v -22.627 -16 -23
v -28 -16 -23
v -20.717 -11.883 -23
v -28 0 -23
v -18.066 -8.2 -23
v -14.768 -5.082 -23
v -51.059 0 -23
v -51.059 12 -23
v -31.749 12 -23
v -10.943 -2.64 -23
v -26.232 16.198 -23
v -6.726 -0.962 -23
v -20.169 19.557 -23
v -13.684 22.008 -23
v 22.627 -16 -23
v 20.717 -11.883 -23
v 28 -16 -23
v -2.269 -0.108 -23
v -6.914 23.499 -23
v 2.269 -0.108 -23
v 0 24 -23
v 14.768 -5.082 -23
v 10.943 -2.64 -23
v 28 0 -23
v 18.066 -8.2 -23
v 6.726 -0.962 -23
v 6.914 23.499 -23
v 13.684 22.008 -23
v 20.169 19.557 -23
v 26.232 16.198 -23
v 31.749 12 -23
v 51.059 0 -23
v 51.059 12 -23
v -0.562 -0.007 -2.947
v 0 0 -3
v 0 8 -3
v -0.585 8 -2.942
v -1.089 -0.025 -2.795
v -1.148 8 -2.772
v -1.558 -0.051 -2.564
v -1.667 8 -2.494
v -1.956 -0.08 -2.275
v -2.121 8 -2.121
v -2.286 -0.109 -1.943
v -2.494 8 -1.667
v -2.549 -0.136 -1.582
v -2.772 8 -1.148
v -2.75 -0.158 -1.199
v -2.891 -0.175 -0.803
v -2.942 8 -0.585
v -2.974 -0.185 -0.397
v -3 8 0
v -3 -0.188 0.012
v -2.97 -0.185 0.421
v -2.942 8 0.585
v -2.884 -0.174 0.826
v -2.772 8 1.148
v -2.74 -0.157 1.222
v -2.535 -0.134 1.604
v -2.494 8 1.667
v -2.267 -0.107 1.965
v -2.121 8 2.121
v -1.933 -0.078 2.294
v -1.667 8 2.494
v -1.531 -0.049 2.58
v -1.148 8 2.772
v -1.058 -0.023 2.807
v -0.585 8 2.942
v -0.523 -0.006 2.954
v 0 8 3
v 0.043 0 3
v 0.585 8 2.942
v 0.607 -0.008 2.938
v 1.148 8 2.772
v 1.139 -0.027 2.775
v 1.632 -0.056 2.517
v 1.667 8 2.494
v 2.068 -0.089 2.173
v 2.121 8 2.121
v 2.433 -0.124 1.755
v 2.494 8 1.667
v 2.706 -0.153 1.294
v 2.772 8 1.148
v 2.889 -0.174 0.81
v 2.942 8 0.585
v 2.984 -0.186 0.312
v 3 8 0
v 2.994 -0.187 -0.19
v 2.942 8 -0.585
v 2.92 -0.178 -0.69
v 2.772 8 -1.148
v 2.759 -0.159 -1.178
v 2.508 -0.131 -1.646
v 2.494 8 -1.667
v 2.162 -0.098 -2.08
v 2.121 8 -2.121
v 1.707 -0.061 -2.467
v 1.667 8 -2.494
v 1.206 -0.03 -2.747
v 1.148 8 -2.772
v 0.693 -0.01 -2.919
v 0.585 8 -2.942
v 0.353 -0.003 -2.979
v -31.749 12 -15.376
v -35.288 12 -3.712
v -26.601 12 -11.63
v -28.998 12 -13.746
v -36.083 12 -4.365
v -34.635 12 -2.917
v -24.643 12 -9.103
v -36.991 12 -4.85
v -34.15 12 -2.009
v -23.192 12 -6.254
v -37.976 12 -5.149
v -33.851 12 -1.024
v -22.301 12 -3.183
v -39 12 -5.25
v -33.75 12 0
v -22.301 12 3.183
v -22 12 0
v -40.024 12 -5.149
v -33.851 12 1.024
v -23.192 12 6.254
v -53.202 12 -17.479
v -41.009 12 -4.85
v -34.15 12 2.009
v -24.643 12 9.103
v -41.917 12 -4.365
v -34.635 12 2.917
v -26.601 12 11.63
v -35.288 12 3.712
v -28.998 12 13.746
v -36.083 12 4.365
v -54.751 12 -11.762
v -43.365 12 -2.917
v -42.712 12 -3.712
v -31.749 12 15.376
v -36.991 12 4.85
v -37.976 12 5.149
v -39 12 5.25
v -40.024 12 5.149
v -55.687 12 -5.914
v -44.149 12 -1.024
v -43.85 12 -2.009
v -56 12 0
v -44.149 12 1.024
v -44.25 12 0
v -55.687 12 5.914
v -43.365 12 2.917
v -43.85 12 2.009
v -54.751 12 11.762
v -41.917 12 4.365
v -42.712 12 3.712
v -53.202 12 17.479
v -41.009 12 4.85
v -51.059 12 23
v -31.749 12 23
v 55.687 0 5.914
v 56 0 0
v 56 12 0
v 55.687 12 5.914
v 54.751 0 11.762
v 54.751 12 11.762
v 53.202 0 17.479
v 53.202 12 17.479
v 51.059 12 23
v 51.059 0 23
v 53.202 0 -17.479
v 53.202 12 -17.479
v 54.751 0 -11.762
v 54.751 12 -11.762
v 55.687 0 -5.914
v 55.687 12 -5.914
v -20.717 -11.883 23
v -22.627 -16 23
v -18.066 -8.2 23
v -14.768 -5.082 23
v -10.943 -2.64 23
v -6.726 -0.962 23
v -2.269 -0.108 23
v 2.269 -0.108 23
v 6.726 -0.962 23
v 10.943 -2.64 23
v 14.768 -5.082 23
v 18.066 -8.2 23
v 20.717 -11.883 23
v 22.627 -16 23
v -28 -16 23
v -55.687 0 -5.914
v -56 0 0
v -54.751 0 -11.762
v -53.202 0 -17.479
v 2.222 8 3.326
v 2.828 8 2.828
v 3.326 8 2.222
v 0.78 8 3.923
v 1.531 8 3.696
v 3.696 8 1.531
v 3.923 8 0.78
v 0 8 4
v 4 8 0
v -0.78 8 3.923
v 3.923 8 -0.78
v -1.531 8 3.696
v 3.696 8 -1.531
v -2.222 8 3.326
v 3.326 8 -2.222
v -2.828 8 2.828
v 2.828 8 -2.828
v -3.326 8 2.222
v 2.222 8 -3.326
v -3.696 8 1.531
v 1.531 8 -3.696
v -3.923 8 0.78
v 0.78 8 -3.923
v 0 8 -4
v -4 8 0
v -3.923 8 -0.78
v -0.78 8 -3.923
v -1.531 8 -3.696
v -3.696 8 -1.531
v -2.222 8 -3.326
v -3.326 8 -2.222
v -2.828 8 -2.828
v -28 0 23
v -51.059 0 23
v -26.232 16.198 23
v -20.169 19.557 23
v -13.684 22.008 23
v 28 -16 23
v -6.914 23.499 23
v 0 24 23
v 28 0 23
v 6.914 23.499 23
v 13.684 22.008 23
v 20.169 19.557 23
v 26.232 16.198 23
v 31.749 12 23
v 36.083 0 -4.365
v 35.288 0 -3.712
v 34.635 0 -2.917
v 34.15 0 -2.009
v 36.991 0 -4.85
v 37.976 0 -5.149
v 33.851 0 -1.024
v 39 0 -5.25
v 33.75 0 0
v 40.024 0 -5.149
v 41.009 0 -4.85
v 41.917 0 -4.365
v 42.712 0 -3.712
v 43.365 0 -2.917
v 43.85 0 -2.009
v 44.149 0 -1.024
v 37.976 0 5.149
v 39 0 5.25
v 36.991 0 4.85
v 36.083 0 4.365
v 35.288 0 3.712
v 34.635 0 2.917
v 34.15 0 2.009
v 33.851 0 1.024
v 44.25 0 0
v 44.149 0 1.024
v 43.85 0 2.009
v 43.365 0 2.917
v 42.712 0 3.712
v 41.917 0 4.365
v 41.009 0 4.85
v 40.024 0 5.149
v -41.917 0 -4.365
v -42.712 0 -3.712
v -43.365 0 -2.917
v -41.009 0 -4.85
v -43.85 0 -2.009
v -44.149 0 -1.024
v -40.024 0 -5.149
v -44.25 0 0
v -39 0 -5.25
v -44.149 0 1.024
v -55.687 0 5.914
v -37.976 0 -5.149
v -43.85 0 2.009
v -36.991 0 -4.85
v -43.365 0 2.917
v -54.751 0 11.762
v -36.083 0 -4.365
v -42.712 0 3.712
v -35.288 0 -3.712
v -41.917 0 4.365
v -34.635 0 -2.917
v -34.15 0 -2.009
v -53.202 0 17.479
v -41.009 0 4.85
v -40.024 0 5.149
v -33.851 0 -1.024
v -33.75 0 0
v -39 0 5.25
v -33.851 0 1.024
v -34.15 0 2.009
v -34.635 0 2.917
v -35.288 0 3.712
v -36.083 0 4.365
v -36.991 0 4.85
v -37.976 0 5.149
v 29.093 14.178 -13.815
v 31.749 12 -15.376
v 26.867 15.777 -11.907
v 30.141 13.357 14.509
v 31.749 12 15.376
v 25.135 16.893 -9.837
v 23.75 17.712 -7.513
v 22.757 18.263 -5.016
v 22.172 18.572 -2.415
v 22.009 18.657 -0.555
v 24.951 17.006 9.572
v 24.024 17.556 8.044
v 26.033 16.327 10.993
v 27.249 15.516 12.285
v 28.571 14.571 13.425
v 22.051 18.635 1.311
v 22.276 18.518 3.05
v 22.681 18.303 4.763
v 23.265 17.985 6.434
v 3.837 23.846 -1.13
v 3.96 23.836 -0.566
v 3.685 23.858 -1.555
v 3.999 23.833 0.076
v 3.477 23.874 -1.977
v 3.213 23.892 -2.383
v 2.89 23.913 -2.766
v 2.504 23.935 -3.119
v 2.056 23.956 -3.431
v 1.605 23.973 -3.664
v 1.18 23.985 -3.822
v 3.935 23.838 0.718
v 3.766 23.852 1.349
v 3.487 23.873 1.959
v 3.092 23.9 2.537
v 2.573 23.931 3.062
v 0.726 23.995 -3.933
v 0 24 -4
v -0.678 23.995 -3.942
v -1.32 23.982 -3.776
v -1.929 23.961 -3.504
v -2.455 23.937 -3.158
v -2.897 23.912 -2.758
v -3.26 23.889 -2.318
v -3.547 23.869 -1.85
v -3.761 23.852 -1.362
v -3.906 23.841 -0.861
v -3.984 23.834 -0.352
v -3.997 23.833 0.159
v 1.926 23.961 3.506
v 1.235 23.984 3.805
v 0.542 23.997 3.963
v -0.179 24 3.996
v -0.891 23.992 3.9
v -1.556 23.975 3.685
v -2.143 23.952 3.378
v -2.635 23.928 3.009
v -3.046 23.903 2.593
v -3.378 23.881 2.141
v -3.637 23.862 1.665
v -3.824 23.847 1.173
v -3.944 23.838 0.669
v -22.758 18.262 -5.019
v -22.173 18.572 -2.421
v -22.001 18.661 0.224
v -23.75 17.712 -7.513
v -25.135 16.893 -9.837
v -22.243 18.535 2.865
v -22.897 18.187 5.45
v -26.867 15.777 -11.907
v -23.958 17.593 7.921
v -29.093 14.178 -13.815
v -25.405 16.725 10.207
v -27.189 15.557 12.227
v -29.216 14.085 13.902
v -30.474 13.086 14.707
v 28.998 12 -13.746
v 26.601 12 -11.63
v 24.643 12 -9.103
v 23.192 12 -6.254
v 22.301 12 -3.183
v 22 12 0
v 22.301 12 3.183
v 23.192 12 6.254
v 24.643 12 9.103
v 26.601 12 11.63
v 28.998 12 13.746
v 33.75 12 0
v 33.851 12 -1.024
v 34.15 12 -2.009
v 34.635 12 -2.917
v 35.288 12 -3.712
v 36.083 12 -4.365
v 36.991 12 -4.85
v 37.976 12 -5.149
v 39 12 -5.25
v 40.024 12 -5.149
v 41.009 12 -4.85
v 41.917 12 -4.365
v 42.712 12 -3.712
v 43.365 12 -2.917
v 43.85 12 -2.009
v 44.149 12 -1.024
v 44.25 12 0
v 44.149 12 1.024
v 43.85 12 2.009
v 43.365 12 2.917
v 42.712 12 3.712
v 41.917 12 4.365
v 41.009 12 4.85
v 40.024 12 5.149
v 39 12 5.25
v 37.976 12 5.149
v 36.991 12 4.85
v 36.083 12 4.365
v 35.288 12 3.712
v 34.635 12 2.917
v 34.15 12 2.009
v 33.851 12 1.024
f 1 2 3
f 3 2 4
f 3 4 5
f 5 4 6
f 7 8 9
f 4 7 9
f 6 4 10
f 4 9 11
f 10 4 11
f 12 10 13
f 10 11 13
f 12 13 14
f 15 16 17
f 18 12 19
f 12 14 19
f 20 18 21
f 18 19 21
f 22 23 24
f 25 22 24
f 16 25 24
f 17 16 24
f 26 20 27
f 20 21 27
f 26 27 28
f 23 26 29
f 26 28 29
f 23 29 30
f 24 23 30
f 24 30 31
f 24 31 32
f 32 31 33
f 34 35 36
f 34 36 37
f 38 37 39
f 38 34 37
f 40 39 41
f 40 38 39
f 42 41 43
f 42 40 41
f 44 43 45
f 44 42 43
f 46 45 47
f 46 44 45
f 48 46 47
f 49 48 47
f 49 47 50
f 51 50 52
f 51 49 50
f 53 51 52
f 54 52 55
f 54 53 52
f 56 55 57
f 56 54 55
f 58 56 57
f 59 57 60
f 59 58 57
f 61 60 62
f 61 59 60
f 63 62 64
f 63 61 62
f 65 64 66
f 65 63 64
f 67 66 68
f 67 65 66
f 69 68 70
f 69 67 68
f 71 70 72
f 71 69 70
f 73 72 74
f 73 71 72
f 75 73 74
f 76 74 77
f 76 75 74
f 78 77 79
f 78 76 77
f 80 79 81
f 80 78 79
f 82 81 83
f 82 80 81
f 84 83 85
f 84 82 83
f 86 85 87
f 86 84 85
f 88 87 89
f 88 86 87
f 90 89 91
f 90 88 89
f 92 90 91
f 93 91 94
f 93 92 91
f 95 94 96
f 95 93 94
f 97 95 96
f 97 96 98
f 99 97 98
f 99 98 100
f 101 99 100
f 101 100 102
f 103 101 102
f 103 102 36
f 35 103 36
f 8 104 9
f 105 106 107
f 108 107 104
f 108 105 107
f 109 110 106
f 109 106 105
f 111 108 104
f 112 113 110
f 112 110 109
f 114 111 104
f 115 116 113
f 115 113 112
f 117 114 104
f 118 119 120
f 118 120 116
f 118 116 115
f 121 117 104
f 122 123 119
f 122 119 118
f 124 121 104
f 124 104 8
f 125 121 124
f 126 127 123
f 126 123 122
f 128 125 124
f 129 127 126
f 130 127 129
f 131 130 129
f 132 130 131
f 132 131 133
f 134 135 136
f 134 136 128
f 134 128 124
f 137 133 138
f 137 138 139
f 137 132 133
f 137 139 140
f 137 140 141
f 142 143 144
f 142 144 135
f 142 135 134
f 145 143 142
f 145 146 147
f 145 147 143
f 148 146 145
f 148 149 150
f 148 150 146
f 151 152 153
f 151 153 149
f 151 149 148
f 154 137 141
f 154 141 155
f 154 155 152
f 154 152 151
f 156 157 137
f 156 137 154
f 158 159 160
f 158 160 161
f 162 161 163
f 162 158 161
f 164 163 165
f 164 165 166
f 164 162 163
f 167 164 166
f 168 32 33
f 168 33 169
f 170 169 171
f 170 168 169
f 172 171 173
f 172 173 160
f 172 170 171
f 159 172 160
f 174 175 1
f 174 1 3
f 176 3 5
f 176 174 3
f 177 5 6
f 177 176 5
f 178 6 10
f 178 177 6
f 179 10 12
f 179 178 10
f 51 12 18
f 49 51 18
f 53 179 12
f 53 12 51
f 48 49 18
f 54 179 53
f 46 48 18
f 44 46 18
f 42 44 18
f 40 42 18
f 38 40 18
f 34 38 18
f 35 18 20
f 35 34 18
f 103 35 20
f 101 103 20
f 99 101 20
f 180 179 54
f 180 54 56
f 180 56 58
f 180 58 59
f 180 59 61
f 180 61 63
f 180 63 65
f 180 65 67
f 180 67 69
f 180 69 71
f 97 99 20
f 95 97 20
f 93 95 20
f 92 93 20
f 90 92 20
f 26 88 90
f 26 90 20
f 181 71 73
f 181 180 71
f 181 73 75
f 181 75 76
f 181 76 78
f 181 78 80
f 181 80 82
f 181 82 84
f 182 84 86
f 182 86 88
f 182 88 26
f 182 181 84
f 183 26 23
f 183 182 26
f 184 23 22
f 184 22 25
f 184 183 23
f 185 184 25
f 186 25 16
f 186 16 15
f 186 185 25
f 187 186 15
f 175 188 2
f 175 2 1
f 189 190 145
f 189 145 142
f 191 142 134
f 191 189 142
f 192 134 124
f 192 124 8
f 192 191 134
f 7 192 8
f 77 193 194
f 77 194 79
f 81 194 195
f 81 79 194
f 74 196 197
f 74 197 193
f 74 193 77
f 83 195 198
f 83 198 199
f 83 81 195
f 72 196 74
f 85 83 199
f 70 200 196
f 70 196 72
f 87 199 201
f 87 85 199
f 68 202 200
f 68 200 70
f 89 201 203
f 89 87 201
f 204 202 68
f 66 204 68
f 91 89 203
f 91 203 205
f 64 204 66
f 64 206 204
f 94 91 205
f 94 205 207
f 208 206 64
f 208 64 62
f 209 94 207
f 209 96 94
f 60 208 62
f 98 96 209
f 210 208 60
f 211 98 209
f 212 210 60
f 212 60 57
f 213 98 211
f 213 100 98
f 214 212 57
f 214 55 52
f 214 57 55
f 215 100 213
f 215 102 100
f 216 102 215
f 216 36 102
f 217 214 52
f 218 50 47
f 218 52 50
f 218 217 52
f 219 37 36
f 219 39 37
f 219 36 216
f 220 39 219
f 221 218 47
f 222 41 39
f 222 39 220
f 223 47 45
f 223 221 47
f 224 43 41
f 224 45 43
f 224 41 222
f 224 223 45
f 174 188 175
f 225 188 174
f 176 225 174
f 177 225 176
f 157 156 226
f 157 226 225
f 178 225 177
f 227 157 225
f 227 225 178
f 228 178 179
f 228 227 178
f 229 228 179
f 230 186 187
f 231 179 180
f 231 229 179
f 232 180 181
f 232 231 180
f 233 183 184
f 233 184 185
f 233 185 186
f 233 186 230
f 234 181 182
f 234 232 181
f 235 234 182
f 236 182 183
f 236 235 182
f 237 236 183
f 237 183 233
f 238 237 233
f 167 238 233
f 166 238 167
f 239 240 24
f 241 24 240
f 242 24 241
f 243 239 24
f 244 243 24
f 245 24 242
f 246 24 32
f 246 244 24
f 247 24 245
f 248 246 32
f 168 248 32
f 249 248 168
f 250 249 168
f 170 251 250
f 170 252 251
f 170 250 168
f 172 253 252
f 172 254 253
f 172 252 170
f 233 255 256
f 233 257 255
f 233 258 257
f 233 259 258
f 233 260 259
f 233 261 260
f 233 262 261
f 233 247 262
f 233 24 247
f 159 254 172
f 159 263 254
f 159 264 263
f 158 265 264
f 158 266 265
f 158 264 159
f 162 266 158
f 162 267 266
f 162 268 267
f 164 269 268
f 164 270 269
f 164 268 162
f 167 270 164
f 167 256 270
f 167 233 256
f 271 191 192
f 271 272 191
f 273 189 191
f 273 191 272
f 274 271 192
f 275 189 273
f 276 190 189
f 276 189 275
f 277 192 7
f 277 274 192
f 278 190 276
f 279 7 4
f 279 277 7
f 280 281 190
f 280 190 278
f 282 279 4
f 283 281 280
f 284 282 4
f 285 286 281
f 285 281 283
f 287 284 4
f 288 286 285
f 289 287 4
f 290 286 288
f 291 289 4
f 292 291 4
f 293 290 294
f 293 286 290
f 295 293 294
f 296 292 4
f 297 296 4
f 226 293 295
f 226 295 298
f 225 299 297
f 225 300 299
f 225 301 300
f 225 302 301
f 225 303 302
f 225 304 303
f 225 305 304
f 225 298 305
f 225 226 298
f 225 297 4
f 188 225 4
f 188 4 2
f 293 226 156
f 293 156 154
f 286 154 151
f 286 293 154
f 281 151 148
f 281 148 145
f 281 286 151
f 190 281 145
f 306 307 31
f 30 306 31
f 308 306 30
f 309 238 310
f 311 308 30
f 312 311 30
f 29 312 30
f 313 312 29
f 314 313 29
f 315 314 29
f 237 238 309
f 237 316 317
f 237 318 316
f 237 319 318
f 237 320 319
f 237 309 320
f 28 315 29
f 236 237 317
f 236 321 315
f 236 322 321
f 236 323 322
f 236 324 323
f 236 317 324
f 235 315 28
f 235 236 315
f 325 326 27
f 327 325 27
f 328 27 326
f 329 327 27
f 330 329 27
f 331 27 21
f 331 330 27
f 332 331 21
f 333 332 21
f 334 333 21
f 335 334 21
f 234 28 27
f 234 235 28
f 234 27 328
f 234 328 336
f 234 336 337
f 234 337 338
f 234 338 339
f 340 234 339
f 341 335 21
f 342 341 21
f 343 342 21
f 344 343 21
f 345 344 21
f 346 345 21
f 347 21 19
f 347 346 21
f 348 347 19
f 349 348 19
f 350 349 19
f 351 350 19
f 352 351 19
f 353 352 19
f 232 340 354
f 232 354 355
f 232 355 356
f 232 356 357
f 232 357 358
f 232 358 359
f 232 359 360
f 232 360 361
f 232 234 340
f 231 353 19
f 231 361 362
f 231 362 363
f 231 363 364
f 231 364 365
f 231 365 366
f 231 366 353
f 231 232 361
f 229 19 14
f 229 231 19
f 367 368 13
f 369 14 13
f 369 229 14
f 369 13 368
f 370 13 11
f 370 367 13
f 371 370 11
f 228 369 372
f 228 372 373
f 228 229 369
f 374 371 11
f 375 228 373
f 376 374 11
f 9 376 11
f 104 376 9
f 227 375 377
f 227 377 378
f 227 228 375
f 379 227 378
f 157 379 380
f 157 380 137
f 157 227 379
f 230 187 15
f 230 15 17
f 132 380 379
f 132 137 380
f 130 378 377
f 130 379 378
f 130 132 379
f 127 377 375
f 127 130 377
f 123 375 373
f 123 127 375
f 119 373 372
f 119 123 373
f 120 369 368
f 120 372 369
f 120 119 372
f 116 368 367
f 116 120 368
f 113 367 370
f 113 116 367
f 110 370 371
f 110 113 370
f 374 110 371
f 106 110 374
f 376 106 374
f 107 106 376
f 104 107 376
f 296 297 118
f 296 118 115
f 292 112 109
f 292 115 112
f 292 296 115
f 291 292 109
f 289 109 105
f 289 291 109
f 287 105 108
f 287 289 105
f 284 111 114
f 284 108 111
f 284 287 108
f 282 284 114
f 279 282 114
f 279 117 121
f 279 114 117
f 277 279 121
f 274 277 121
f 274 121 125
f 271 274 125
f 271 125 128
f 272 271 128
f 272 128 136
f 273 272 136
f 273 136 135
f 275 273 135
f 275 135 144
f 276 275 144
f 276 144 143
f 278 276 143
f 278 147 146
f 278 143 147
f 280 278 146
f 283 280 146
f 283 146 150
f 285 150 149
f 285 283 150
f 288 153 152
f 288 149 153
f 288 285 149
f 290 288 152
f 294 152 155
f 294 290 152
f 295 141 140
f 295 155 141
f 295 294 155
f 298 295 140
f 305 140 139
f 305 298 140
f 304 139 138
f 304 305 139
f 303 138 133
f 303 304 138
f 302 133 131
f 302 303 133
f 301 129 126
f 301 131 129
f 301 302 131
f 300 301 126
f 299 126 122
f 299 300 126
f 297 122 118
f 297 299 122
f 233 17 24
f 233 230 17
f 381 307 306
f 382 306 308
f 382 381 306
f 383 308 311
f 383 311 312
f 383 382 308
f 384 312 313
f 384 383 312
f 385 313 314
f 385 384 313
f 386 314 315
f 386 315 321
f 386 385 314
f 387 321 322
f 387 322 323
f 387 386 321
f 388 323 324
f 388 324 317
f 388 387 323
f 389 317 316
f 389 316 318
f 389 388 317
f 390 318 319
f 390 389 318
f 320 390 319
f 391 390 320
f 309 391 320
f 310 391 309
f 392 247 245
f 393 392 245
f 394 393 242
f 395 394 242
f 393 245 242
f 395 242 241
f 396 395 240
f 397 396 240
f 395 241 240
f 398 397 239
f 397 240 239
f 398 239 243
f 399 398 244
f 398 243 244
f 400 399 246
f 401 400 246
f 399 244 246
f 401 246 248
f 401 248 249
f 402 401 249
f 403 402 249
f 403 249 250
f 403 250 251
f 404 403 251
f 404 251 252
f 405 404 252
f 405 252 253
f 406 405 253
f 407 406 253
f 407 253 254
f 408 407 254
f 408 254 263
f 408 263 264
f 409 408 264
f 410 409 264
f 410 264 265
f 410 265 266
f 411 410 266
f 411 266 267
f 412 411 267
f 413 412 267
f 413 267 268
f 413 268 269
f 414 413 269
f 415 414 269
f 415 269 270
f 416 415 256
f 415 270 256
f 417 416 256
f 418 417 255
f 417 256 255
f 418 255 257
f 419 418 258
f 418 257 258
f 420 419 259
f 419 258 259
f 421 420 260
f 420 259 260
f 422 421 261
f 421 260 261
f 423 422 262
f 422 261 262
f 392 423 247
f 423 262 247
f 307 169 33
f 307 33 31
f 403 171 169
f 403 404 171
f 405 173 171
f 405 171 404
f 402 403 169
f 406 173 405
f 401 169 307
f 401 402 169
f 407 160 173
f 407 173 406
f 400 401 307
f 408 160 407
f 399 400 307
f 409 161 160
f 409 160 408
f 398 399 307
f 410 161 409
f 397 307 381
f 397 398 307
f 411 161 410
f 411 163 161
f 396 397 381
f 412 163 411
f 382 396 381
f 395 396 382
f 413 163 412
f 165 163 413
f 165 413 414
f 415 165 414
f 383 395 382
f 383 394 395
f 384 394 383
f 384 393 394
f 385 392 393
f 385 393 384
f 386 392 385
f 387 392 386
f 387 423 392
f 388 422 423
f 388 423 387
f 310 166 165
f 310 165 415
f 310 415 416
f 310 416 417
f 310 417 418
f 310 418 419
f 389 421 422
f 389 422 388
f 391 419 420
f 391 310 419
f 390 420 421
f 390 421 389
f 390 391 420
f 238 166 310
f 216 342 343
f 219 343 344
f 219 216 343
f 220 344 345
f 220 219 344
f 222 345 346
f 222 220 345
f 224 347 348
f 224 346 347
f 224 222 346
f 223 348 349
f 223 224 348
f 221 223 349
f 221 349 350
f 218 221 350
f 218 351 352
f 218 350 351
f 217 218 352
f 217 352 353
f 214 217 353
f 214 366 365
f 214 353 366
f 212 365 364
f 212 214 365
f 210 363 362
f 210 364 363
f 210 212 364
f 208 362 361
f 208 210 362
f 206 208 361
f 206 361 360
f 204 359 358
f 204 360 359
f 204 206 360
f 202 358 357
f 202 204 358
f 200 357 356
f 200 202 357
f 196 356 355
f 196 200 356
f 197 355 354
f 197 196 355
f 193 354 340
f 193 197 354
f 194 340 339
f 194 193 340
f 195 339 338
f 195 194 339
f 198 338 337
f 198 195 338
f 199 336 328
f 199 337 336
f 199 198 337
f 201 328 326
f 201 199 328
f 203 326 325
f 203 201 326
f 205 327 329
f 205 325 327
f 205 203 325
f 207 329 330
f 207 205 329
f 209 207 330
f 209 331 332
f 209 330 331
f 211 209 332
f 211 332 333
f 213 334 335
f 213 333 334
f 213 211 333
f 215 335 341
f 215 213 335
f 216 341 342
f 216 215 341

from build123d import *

# Parameters (mm, degrees)
BOSS_EXTRUDE1_DEPTH    = 23
CUT_EXTRUDE1_START     = -12
CUT_EXTRUDE1_DEPTH     = 12
SKETCH4_R              = 17
CUT_EXTRUDE2_DEPTH     = 46
M12X1_5_TAPPED_HOLE1_D = 10.5


# Read off the part's stored shape, not the designer's step: Cut-Extrude1
with BuildPart() as part:
    # Sketch1 → Boss-Extrude1 (new, symmetric)
    with BuildSketch(Plane.XY):
        with BuildLine():
            Line((56, 0), (56, 12))
            Line((56, 12), (31.749015733, 12))
            ThreePointArc((31.749015733, 12), (0, 24), (-31.749015733, 12))
            Line((-31.749015733, 12), (-56, 12))
            Line((-56, 12), (-56, 0))
            Line((-56, 0), (-28, 0))
            Line((-28, 0), (-28, -16))
            Line((-28, -16), (-22.627416998, -16))
            ThreePointArc((-22.627416998, -16), (0, 0), (22.627416998, -16))
            Line((22.627416998, -16), (28, -16))
            Line((28, -16), (28, 0))
            Line((28, 0), (56, 0))
        make_face()
    extrude(amount=BOSS_EXTRUDE1_DEPTH, both=True)

    # Cut-Extrude1 outline → Cut-Extrude1 (cut)
    with BuildSketch(Plane(origin=(0, 12, 0), x_dir=(1, 0, 0), z_dir=(0, 1, 0)).offset(CUT_EXTRUDE1_START)):
        with BuildLine():
            ThreePointArc((-56, 0), (-54.750763557, 11.762393036), (-51.058789645, 23))
            Line((-51.058789645, 23), (-56, 23))
            Line((-56, 23), (-56, 0))
        make_face()
        with BuildLine():
            ThreePointArc((-51.058789645, -23), (-54.750763557, -11.762393036), (-56, 0))
            Line((-56, 0), (-56, -23))
            Line((-56, -23), (-51.058789645, -23))
        make_face()
        with BuildLine():
            Line((56, 23), (51.058789645, 23))
            ThreePointArc((51.058789645, 23), (54.750763557, 11.762393036), (56, 0))
            Line((56, 0), (56, 23))
        make_face()
        with BuildLine():
            Line((56, -23), (56, 0))
            ThreePointArc((56, 0), (54.750763557, -11.762393036), (51.058789645, -23))
            Line((51.058789645, -23), (56, -23))
        make_face()
    extrude(amount=CUT_EXTRUDE1_DEPTH, mode=Mode.SUBTRACT)

    # Sketch4 → Cut-Extrude2 (cut)
    with BuildSketch(Plane(origin=(0, 12, 0), x_dir=(1, 0, 0), z_dir=(0, 1, 0))):
        with Locations((39, 0)):
            Circle(SKETCH4_R)
        with Locations((-39, 0)):
            Circle(SKETCH4_R)
    extrude(amount=CUT_EXTRUDE2_DEPTH, mode=Mode.SUBTRACT)

    # M12x1.5 Tapped Hole1 (through all)
    with Locations(Plane(origin=(39, 12, 0), x_dir=(1, 0, 0), z_dir=(0, 1, 0))):
        with Locations((0, 0)):
            m12x1_5_tapped_hole1 = Hole(M12X1_5_TAPPED_HOLE1_D / 2)

    # Mirror1: M12x1.5 Tapped Hole1 across plane
    add(m12x1_5_tapped_hole1.mirror(Plane(origin=(0, 0, 0), x_dir=(0, 0, 1), z_dir=(1, 0, 0))), mode=Mode.SUBTRACT)

    # Sketch7 → Cut-Revolve4 (revolve, cut)
    with BuildSketch(Plane.XY, mode=Mode.PRIVATE) as cut_revolve4_sk:
        Polygon((0, 24), (4, 24), (4, 8), (3, 8), (3, -2.439893383), (0, -2.439893383), align=None)
    revolve(cut_revolve4_sk.sketch.rotate(Axis((0, 0, 0), (0, 1, 0)), 90), axis=Axis((0, 0, 0), (0, 1, 0)), mode=Mode.SUBTRACT)


solid = part.part
